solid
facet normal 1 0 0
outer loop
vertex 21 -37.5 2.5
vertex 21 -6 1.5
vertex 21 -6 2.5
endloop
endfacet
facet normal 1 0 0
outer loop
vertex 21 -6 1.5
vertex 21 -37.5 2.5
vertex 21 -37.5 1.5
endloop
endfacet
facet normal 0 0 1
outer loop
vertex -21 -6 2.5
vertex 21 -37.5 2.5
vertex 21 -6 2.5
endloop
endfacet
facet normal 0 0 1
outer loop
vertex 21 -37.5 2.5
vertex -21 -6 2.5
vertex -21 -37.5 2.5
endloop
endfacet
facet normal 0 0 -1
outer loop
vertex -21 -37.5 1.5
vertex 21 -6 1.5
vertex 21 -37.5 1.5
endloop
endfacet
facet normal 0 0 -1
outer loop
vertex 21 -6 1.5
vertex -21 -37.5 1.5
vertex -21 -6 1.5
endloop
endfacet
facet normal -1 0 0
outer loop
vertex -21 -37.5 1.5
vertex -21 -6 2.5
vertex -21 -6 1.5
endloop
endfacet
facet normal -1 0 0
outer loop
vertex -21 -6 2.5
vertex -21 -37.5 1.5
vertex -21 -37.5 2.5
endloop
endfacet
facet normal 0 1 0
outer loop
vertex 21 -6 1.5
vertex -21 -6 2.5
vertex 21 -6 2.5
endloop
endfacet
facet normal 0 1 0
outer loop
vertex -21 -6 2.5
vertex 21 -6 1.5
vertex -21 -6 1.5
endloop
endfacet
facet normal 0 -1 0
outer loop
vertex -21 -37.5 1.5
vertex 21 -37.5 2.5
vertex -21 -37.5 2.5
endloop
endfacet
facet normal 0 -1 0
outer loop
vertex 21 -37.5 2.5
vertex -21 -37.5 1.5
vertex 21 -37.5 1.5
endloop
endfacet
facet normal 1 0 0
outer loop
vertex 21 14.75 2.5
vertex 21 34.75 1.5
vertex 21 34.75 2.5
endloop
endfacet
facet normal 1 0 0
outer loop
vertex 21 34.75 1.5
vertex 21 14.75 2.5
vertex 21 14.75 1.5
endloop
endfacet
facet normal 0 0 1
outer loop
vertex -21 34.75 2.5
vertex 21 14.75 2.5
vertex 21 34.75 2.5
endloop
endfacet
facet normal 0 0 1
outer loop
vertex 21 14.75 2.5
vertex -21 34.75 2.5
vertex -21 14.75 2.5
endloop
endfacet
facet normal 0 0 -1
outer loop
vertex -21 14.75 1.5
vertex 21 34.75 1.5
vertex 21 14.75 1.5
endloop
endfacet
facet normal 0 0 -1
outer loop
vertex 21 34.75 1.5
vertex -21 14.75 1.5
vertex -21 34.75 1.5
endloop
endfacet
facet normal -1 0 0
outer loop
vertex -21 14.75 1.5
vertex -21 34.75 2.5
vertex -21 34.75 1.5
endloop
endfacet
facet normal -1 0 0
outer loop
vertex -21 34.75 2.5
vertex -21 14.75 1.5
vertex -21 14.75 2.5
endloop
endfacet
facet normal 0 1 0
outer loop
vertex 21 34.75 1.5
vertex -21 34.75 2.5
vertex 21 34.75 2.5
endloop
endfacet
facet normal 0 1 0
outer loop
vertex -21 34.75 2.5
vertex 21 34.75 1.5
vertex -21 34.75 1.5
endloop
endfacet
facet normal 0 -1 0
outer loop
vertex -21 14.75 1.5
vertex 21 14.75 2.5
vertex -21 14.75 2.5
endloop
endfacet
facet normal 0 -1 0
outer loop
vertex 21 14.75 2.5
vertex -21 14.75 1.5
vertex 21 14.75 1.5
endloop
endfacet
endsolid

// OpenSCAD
module window(width, height, depth=2)
{
    aspect = height / width;
    x = width / 2;
    y = height / 2;
    z = depth / 2;

    middle_plane = 0;

    offset = width * 0.1;
    padding = width * 0.05;
    x2 = x - offset;
    y2 = y - offset;
    
    //difference() {
        polyhedron(
          points=[       
            [x2,y2,middle_plane],
            [x2,-y2,middle_plane],
            [-x2,-y2,middle_plane],
            [-x2,y2,middle_plane],

            [x,y,z],
            [x,-y,z],
            [-x,-y,z],
            [-x,y,z],
            
            [x,y,-z],
            [x,-y,-z],
            [-x,-y,-z],
            [-x,y,-z]
          ],                               
          faces=[
            //slant sides
            [0,1,5,4],
            [1,2,6,5],
            [2,3,7,6],
            [3,0,4,7],
            
            //sides
            [4,5,9,8],
            [5,6,10,9],
            [6,7,11,10],
            [7,4,8,11],
            
            //top and bottom
            [0,1,2,3],
            //[4,5,6,7]
            [8,9,10,11]
          ]
        );
        translate([0,-(y/2),2]) cube([width - (offset * 2) - (padding * 2),y-offset-(padding * 2),1], center=true);
        translate([0,(y/2)+padding,2]) cube([width - (offset * 2) - (padding * 2),20,1], center=true);
    //}
}
window(60,87);
